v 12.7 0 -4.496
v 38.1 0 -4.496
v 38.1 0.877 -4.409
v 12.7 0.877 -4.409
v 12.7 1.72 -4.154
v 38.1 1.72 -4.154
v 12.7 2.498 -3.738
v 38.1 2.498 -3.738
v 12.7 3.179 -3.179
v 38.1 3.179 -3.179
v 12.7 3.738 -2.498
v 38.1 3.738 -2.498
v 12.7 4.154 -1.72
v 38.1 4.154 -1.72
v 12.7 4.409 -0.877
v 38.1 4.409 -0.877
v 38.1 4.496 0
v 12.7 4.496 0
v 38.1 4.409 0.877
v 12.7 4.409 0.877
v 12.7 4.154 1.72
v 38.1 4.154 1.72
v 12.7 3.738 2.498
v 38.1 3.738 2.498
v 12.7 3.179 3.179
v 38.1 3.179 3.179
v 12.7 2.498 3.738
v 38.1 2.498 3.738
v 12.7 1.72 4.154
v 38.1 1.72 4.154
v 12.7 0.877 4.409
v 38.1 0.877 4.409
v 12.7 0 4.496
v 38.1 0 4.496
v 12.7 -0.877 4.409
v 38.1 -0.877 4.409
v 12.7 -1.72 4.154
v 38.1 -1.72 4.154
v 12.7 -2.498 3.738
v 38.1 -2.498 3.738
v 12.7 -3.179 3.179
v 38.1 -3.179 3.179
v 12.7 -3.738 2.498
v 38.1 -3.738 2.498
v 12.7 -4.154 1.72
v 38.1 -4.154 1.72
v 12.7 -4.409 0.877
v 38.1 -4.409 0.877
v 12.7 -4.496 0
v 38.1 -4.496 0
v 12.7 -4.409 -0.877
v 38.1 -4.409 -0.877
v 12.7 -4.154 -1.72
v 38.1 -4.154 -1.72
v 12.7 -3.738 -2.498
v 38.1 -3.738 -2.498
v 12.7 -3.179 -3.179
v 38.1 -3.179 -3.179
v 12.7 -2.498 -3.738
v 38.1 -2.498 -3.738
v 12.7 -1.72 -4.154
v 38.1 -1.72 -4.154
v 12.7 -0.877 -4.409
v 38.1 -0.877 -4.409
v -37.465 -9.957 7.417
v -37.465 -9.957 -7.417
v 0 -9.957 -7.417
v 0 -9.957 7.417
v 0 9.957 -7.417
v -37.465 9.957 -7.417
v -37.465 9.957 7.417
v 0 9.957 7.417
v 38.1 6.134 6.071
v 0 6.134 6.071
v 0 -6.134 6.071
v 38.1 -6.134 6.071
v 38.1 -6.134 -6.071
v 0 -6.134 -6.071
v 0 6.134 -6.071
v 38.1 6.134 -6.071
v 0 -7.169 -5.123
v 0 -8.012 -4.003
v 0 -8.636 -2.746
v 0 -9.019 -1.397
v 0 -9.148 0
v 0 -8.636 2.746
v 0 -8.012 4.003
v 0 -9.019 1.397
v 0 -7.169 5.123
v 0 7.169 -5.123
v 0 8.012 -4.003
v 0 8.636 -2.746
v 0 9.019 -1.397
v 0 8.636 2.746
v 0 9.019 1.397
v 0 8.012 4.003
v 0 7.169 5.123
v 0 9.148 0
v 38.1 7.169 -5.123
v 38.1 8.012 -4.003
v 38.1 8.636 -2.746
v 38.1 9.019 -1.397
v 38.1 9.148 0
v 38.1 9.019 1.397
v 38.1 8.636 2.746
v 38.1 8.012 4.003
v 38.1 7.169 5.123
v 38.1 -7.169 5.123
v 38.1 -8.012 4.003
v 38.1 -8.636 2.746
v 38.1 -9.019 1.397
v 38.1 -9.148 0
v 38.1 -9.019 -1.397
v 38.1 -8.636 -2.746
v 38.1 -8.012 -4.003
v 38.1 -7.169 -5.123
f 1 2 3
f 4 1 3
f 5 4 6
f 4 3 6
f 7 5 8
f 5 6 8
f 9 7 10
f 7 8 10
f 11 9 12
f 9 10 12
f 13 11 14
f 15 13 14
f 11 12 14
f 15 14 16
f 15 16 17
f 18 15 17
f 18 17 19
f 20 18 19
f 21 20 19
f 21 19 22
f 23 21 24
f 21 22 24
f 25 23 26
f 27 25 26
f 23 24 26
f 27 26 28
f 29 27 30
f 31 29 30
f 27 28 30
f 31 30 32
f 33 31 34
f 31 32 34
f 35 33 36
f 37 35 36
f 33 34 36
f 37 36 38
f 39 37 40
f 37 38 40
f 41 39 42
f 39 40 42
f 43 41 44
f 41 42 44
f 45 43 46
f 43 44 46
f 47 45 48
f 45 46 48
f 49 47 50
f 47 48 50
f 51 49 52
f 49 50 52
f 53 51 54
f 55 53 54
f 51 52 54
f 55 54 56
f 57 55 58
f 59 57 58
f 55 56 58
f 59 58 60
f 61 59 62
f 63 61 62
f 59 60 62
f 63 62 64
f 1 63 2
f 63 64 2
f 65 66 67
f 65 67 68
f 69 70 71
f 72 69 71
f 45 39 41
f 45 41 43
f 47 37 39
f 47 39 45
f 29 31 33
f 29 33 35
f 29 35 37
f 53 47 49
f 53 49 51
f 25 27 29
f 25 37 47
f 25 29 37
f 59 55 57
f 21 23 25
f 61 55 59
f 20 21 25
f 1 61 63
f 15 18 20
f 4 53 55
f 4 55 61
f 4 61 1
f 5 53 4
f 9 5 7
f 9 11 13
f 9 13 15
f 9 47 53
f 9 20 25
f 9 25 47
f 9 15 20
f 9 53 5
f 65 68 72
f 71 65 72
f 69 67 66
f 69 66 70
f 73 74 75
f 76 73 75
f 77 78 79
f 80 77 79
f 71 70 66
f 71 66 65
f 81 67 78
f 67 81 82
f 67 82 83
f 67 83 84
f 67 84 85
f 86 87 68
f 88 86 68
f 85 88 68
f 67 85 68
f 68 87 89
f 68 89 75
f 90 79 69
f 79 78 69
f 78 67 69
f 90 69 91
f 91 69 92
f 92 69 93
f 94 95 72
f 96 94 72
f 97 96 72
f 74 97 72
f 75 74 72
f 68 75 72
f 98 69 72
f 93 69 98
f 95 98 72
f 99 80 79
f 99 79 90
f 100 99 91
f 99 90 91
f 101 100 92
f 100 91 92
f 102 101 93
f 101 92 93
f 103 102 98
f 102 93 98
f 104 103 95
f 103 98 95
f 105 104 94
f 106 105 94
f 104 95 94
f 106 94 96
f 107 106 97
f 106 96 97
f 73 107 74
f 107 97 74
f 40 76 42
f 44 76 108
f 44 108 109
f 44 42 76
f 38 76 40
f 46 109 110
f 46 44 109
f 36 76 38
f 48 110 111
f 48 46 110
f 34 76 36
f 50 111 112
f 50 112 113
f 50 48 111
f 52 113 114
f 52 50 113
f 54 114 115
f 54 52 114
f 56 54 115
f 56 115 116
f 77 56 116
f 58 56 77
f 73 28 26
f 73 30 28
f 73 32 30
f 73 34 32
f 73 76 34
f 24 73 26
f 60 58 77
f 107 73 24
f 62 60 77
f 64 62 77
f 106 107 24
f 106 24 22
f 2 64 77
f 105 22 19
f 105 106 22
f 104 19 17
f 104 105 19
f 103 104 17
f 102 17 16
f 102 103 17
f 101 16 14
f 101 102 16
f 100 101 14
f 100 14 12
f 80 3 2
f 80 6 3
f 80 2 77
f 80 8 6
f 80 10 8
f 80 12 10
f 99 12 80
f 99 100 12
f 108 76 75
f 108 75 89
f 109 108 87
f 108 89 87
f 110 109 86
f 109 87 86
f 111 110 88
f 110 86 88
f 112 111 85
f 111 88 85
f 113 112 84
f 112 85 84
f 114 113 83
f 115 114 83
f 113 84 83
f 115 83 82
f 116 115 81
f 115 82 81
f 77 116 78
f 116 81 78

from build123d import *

# Parameters (mm, degrees)
BOSS_EXTRUDE1_DEPTH = 38.1
SKETCH2_R           = 4.4958
CUT_EXTRUDE1_DEPTH  = 25.4
SKETCH4_W           = 14.8336
SKETCH4_H           = 19.9136
BOSS_EXTRUDE2_DEPTH = 37.465


with BuildPart() as part:
    # Sketch1 → Boss-Extrude1 (new body)
    with BuildSketch(Plane(origin=(0, 0, 0), x_dir=(0, 0, -1), z_dir=(1, 0, 0))):
        with BuildLine():
            Line((-6.0706, 6.1341), (-6.0706, -6.1341))
            ThreePointArc((-6.0706, -6.1341), (0, -9.148427884), (6.0706, -6.1341))
            Line((6.0706, -6.1341), (6.0706, 6.1341))
            ThreePointArc((6.0706, 6.1341), (0, 9.148427884), (-6.0706, 6.1341))
        make_face()
    extrude(amount=BOSS_EXTRUDE1_DEPTH)

    # Sketch2 → Cut-Extrude1 (cut)
    with BuildSketch(Plane(origin=(38.1, 0, 0), x_dir=(0, 0, -1), z_dir=(1, 0, 0))):
        Circle(SKETCH2_R)
    extrude(amount=-CUT_EXTRUDE1_DEPTH, mode=Mode.SUBTRACT)

    # Sketch4 → Boss-Extrude2 (add)
    with BuildSketch(Plane.ZY):
        Rectangle(SKETCH4_W, SKETCH4_H)
    extrude(amount=BOSS_EXTRUDE2_DEPTH)


solid = part.part
